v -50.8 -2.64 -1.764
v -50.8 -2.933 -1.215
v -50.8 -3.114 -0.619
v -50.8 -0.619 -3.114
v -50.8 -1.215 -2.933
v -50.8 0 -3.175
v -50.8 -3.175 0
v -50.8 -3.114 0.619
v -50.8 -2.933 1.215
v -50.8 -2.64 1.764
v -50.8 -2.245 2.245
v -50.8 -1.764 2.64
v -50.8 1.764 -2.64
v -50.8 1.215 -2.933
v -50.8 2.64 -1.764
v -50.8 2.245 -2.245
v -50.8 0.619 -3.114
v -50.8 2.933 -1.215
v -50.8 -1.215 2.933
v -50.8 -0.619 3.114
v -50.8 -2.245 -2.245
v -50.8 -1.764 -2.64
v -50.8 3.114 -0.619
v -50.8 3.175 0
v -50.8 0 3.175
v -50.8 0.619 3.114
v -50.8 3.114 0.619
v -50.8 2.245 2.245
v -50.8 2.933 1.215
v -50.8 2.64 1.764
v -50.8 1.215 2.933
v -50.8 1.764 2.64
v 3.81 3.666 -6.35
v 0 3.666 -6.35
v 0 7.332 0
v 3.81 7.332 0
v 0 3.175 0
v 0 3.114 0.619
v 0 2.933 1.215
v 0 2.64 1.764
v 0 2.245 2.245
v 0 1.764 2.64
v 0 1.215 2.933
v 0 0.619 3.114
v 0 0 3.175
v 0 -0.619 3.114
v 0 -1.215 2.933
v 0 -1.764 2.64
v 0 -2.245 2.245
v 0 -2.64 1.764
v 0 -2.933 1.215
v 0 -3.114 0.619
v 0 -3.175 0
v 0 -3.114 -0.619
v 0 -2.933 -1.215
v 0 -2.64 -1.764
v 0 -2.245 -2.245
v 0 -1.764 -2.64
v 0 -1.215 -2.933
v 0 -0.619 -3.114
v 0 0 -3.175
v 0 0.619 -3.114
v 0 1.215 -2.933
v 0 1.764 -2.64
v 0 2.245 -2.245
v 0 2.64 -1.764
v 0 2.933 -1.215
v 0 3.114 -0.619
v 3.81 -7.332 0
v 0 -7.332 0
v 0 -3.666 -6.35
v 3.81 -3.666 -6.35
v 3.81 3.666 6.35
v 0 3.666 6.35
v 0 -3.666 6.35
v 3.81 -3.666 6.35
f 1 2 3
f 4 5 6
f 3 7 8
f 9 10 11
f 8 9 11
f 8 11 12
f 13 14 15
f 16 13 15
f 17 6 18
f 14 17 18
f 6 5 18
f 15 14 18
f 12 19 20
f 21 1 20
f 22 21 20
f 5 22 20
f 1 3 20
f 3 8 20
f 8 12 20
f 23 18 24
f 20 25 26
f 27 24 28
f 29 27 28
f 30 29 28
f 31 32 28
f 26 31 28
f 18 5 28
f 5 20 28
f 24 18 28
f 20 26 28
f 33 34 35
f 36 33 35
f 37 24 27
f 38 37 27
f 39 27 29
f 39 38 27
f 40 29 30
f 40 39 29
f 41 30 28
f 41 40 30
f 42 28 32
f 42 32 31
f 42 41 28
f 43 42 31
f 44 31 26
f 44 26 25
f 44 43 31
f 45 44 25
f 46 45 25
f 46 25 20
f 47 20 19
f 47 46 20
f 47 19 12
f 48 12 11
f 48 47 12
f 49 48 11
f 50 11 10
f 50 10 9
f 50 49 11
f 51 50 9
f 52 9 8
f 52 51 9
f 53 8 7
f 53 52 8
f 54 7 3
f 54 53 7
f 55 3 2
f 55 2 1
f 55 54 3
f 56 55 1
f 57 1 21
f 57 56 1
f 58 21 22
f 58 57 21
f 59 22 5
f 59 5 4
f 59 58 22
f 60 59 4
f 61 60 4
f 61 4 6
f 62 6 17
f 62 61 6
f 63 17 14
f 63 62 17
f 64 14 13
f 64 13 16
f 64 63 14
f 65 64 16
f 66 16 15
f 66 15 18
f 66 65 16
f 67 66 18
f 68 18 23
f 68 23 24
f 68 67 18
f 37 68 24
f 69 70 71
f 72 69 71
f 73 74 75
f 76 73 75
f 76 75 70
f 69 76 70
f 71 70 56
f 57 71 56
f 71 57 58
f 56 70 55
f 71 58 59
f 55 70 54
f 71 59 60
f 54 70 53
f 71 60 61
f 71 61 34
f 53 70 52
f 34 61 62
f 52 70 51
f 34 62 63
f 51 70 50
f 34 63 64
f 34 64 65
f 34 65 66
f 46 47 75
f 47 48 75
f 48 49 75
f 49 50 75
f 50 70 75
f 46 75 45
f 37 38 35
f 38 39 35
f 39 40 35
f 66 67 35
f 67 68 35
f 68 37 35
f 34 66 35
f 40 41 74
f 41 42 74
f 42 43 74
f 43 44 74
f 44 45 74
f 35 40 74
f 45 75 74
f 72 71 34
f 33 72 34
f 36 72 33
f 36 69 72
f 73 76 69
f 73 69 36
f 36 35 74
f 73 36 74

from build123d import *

# Parameters (mm, degrees)
F1_DEPTH = 3.81
F2_R     = 3.175
F3_DEPTH = 50.8


with BuildPart() as f1:
    # F0 (on Right) → F1 (new body)
    with BuildSketch(Plane.YZ):
        Polygon((-3.666174, -6.35), (3.666174, -6.35), (7.332348, 0), (3.666174, 6.35), (-3.666174, 6.35), (-7.332348, 0), align=None)
    extrude(amount=F1_DEPTH)

    # F2 (on Right) → F3 (join)
    with BuildSketch(Plane.YZ):
        Circle(F2_R)
    extrude(amount=-F3_DEPTH)


solid = f1.part
